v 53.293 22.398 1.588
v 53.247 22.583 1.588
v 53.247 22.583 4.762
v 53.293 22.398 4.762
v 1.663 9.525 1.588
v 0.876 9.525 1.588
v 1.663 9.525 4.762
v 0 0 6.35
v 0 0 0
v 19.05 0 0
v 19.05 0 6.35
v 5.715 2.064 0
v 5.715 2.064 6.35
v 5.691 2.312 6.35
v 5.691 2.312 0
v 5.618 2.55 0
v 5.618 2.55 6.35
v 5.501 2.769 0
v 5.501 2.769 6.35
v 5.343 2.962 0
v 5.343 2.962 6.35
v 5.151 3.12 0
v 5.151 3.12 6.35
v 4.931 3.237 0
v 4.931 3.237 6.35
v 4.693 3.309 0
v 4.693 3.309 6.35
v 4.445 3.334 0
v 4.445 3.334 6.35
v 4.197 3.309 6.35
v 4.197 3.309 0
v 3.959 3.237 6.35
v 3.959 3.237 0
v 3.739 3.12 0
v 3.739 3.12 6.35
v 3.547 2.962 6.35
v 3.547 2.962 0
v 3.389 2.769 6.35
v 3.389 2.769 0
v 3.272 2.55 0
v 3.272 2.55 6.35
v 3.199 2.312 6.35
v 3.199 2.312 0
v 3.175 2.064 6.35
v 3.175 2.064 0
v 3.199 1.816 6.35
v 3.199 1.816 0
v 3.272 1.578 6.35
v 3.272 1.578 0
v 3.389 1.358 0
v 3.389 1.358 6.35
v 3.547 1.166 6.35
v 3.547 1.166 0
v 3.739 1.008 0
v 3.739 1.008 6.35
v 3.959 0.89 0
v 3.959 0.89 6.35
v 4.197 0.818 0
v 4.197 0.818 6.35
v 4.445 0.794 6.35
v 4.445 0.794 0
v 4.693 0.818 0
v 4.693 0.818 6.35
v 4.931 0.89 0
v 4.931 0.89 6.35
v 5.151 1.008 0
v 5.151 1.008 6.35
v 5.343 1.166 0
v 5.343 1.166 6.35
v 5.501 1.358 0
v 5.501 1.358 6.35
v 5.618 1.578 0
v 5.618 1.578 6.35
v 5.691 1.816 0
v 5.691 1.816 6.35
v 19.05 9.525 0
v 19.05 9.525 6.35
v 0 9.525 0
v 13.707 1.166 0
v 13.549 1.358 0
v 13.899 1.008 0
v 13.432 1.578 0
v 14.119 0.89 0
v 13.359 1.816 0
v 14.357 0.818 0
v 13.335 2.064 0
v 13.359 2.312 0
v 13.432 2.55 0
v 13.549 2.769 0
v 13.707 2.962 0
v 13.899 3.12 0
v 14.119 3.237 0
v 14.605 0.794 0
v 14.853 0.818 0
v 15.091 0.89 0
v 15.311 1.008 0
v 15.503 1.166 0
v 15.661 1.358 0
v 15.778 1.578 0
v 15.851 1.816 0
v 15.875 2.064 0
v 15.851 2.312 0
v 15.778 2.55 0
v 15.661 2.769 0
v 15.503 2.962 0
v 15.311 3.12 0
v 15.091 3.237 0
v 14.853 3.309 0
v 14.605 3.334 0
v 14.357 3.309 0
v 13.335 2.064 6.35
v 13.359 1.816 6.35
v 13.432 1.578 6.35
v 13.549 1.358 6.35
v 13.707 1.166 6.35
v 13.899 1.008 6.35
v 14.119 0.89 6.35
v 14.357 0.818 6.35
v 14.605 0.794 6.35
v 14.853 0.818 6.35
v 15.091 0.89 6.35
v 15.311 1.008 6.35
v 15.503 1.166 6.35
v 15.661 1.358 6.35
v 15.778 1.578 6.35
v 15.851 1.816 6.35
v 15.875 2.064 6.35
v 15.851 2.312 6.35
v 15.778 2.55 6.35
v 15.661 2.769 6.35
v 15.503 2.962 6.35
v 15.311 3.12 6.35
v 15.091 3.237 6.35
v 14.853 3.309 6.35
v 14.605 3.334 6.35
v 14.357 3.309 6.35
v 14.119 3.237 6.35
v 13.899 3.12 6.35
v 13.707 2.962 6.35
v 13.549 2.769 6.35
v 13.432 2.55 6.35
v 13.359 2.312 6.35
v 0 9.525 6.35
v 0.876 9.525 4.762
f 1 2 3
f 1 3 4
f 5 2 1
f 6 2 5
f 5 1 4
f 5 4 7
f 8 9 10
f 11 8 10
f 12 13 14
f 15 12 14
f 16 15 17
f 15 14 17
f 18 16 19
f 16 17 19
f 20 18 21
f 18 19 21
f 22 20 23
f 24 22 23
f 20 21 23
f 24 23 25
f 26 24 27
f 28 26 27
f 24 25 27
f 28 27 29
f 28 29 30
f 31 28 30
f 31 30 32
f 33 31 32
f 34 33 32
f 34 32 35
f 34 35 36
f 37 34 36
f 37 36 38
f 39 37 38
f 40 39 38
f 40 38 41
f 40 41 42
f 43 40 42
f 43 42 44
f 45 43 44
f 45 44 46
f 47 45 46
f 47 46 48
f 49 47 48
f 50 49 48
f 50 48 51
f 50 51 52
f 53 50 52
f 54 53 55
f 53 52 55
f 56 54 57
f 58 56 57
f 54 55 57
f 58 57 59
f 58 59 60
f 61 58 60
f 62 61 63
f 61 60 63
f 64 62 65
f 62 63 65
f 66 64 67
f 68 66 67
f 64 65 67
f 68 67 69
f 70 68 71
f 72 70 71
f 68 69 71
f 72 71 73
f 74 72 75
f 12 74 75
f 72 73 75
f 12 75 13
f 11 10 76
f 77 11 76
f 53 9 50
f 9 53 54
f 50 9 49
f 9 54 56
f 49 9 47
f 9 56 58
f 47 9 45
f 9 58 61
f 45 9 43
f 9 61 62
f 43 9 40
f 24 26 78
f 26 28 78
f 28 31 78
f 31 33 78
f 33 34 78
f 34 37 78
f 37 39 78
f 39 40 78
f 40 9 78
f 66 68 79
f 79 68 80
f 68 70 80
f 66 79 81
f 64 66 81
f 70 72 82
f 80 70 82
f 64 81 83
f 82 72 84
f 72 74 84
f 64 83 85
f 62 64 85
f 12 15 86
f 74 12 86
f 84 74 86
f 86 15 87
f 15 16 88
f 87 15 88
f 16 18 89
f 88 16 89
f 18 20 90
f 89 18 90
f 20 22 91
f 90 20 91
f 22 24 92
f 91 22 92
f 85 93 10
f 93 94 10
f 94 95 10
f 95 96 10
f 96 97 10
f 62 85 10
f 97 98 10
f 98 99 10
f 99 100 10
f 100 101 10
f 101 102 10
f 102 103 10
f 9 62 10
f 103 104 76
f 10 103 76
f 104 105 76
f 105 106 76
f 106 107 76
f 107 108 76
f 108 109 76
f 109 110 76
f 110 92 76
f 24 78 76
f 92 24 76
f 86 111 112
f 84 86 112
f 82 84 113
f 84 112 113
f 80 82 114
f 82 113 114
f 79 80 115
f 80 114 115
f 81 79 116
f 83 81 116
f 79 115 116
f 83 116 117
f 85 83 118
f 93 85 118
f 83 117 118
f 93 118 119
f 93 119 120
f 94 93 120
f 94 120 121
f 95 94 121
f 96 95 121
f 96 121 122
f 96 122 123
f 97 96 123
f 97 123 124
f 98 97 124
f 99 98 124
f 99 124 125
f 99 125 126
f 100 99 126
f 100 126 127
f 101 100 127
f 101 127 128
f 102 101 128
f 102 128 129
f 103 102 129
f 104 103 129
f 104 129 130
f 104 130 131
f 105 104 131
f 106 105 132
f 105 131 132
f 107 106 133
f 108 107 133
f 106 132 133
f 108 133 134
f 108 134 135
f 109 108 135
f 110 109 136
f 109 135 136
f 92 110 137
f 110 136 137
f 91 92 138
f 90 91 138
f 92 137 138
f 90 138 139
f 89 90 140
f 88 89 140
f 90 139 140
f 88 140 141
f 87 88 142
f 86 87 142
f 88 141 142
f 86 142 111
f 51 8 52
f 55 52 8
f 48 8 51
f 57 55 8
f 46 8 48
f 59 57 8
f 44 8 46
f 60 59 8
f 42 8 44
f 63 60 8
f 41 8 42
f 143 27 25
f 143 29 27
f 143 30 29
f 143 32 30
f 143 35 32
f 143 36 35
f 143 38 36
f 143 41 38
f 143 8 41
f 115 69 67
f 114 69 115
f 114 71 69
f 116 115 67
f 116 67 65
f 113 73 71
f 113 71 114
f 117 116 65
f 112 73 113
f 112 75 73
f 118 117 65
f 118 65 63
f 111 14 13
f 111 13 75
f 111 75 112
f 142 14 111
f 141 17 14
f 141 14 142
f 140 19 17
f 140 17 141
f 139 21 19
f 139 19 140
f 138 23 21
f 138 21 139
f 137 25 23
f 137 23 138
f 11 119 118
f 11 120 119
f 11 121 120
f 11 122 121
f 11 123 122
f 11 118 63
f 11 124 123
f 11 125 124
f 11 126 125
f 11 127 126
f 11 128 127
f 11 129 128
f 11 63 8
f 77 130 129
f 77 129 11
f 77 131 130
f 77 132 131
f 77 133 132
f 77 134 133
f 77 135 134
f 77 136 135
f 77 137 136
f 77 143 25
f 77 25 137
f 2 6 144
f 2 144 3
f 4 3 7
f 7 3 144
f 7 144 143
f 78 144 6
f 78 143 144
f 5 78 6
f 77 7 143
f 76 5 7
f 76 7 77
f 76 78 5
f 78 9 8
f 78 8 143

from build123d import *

# Parameters (mm, degrees)
SKETCH1_W           = 19.05
SKETCH1_H           = 9.525
BOSS_EXTRUDE1_DEPTH = 6.35
BOSS_EXTRUDE2_START = 1.5875
BOSS_EXTRUDE2_DEPTH = 3.175
SKETCH3_R           = 1.27
CUT_EXTRUDE1_DEPTH  = 59.227939899


with BuildPart() as part:
    # Sketch1 → Boss-Extrude1 (new body)
    with BuildSketch(Plane.XY):
        with Locations((9.525, 4.7625)):
            Rectangle(SKETCH1_W, SKETCH1_H)
    extrude(amount=BOSS_EXTRUDE1_DEPTH)

    # Sketch2 → Boss-Extrude2 (add)
    with BuildSketch(Plane.XY.offset(BOSS_EXTRUDE2_START)):
        Polygon((0.875640633, 9.525), (53.247352459, 22.582734315), (53.29343858, 22.397892979), (1.66308486, 9.525), align=None)
    extrude(amount=BOSS_EXTRUDE2_DEPTH)

    # Sketch3 → Cut-Extrude1 (cut, through all)
    with BuildSketch(Plane.XY.offset(6.35)):
        with Locations((4.445, 2.06375)):
            Circle(SKETCH3_R)
        with Locations(Location((14.605, 2.06375, 0), (0, 0, 180))):
            Circle(SKETCH3_R)
    extrude(amount=-CUT_EXTRUDE1_DEPTH, mode=Mode.SUBTRACT)


solid = part.part
